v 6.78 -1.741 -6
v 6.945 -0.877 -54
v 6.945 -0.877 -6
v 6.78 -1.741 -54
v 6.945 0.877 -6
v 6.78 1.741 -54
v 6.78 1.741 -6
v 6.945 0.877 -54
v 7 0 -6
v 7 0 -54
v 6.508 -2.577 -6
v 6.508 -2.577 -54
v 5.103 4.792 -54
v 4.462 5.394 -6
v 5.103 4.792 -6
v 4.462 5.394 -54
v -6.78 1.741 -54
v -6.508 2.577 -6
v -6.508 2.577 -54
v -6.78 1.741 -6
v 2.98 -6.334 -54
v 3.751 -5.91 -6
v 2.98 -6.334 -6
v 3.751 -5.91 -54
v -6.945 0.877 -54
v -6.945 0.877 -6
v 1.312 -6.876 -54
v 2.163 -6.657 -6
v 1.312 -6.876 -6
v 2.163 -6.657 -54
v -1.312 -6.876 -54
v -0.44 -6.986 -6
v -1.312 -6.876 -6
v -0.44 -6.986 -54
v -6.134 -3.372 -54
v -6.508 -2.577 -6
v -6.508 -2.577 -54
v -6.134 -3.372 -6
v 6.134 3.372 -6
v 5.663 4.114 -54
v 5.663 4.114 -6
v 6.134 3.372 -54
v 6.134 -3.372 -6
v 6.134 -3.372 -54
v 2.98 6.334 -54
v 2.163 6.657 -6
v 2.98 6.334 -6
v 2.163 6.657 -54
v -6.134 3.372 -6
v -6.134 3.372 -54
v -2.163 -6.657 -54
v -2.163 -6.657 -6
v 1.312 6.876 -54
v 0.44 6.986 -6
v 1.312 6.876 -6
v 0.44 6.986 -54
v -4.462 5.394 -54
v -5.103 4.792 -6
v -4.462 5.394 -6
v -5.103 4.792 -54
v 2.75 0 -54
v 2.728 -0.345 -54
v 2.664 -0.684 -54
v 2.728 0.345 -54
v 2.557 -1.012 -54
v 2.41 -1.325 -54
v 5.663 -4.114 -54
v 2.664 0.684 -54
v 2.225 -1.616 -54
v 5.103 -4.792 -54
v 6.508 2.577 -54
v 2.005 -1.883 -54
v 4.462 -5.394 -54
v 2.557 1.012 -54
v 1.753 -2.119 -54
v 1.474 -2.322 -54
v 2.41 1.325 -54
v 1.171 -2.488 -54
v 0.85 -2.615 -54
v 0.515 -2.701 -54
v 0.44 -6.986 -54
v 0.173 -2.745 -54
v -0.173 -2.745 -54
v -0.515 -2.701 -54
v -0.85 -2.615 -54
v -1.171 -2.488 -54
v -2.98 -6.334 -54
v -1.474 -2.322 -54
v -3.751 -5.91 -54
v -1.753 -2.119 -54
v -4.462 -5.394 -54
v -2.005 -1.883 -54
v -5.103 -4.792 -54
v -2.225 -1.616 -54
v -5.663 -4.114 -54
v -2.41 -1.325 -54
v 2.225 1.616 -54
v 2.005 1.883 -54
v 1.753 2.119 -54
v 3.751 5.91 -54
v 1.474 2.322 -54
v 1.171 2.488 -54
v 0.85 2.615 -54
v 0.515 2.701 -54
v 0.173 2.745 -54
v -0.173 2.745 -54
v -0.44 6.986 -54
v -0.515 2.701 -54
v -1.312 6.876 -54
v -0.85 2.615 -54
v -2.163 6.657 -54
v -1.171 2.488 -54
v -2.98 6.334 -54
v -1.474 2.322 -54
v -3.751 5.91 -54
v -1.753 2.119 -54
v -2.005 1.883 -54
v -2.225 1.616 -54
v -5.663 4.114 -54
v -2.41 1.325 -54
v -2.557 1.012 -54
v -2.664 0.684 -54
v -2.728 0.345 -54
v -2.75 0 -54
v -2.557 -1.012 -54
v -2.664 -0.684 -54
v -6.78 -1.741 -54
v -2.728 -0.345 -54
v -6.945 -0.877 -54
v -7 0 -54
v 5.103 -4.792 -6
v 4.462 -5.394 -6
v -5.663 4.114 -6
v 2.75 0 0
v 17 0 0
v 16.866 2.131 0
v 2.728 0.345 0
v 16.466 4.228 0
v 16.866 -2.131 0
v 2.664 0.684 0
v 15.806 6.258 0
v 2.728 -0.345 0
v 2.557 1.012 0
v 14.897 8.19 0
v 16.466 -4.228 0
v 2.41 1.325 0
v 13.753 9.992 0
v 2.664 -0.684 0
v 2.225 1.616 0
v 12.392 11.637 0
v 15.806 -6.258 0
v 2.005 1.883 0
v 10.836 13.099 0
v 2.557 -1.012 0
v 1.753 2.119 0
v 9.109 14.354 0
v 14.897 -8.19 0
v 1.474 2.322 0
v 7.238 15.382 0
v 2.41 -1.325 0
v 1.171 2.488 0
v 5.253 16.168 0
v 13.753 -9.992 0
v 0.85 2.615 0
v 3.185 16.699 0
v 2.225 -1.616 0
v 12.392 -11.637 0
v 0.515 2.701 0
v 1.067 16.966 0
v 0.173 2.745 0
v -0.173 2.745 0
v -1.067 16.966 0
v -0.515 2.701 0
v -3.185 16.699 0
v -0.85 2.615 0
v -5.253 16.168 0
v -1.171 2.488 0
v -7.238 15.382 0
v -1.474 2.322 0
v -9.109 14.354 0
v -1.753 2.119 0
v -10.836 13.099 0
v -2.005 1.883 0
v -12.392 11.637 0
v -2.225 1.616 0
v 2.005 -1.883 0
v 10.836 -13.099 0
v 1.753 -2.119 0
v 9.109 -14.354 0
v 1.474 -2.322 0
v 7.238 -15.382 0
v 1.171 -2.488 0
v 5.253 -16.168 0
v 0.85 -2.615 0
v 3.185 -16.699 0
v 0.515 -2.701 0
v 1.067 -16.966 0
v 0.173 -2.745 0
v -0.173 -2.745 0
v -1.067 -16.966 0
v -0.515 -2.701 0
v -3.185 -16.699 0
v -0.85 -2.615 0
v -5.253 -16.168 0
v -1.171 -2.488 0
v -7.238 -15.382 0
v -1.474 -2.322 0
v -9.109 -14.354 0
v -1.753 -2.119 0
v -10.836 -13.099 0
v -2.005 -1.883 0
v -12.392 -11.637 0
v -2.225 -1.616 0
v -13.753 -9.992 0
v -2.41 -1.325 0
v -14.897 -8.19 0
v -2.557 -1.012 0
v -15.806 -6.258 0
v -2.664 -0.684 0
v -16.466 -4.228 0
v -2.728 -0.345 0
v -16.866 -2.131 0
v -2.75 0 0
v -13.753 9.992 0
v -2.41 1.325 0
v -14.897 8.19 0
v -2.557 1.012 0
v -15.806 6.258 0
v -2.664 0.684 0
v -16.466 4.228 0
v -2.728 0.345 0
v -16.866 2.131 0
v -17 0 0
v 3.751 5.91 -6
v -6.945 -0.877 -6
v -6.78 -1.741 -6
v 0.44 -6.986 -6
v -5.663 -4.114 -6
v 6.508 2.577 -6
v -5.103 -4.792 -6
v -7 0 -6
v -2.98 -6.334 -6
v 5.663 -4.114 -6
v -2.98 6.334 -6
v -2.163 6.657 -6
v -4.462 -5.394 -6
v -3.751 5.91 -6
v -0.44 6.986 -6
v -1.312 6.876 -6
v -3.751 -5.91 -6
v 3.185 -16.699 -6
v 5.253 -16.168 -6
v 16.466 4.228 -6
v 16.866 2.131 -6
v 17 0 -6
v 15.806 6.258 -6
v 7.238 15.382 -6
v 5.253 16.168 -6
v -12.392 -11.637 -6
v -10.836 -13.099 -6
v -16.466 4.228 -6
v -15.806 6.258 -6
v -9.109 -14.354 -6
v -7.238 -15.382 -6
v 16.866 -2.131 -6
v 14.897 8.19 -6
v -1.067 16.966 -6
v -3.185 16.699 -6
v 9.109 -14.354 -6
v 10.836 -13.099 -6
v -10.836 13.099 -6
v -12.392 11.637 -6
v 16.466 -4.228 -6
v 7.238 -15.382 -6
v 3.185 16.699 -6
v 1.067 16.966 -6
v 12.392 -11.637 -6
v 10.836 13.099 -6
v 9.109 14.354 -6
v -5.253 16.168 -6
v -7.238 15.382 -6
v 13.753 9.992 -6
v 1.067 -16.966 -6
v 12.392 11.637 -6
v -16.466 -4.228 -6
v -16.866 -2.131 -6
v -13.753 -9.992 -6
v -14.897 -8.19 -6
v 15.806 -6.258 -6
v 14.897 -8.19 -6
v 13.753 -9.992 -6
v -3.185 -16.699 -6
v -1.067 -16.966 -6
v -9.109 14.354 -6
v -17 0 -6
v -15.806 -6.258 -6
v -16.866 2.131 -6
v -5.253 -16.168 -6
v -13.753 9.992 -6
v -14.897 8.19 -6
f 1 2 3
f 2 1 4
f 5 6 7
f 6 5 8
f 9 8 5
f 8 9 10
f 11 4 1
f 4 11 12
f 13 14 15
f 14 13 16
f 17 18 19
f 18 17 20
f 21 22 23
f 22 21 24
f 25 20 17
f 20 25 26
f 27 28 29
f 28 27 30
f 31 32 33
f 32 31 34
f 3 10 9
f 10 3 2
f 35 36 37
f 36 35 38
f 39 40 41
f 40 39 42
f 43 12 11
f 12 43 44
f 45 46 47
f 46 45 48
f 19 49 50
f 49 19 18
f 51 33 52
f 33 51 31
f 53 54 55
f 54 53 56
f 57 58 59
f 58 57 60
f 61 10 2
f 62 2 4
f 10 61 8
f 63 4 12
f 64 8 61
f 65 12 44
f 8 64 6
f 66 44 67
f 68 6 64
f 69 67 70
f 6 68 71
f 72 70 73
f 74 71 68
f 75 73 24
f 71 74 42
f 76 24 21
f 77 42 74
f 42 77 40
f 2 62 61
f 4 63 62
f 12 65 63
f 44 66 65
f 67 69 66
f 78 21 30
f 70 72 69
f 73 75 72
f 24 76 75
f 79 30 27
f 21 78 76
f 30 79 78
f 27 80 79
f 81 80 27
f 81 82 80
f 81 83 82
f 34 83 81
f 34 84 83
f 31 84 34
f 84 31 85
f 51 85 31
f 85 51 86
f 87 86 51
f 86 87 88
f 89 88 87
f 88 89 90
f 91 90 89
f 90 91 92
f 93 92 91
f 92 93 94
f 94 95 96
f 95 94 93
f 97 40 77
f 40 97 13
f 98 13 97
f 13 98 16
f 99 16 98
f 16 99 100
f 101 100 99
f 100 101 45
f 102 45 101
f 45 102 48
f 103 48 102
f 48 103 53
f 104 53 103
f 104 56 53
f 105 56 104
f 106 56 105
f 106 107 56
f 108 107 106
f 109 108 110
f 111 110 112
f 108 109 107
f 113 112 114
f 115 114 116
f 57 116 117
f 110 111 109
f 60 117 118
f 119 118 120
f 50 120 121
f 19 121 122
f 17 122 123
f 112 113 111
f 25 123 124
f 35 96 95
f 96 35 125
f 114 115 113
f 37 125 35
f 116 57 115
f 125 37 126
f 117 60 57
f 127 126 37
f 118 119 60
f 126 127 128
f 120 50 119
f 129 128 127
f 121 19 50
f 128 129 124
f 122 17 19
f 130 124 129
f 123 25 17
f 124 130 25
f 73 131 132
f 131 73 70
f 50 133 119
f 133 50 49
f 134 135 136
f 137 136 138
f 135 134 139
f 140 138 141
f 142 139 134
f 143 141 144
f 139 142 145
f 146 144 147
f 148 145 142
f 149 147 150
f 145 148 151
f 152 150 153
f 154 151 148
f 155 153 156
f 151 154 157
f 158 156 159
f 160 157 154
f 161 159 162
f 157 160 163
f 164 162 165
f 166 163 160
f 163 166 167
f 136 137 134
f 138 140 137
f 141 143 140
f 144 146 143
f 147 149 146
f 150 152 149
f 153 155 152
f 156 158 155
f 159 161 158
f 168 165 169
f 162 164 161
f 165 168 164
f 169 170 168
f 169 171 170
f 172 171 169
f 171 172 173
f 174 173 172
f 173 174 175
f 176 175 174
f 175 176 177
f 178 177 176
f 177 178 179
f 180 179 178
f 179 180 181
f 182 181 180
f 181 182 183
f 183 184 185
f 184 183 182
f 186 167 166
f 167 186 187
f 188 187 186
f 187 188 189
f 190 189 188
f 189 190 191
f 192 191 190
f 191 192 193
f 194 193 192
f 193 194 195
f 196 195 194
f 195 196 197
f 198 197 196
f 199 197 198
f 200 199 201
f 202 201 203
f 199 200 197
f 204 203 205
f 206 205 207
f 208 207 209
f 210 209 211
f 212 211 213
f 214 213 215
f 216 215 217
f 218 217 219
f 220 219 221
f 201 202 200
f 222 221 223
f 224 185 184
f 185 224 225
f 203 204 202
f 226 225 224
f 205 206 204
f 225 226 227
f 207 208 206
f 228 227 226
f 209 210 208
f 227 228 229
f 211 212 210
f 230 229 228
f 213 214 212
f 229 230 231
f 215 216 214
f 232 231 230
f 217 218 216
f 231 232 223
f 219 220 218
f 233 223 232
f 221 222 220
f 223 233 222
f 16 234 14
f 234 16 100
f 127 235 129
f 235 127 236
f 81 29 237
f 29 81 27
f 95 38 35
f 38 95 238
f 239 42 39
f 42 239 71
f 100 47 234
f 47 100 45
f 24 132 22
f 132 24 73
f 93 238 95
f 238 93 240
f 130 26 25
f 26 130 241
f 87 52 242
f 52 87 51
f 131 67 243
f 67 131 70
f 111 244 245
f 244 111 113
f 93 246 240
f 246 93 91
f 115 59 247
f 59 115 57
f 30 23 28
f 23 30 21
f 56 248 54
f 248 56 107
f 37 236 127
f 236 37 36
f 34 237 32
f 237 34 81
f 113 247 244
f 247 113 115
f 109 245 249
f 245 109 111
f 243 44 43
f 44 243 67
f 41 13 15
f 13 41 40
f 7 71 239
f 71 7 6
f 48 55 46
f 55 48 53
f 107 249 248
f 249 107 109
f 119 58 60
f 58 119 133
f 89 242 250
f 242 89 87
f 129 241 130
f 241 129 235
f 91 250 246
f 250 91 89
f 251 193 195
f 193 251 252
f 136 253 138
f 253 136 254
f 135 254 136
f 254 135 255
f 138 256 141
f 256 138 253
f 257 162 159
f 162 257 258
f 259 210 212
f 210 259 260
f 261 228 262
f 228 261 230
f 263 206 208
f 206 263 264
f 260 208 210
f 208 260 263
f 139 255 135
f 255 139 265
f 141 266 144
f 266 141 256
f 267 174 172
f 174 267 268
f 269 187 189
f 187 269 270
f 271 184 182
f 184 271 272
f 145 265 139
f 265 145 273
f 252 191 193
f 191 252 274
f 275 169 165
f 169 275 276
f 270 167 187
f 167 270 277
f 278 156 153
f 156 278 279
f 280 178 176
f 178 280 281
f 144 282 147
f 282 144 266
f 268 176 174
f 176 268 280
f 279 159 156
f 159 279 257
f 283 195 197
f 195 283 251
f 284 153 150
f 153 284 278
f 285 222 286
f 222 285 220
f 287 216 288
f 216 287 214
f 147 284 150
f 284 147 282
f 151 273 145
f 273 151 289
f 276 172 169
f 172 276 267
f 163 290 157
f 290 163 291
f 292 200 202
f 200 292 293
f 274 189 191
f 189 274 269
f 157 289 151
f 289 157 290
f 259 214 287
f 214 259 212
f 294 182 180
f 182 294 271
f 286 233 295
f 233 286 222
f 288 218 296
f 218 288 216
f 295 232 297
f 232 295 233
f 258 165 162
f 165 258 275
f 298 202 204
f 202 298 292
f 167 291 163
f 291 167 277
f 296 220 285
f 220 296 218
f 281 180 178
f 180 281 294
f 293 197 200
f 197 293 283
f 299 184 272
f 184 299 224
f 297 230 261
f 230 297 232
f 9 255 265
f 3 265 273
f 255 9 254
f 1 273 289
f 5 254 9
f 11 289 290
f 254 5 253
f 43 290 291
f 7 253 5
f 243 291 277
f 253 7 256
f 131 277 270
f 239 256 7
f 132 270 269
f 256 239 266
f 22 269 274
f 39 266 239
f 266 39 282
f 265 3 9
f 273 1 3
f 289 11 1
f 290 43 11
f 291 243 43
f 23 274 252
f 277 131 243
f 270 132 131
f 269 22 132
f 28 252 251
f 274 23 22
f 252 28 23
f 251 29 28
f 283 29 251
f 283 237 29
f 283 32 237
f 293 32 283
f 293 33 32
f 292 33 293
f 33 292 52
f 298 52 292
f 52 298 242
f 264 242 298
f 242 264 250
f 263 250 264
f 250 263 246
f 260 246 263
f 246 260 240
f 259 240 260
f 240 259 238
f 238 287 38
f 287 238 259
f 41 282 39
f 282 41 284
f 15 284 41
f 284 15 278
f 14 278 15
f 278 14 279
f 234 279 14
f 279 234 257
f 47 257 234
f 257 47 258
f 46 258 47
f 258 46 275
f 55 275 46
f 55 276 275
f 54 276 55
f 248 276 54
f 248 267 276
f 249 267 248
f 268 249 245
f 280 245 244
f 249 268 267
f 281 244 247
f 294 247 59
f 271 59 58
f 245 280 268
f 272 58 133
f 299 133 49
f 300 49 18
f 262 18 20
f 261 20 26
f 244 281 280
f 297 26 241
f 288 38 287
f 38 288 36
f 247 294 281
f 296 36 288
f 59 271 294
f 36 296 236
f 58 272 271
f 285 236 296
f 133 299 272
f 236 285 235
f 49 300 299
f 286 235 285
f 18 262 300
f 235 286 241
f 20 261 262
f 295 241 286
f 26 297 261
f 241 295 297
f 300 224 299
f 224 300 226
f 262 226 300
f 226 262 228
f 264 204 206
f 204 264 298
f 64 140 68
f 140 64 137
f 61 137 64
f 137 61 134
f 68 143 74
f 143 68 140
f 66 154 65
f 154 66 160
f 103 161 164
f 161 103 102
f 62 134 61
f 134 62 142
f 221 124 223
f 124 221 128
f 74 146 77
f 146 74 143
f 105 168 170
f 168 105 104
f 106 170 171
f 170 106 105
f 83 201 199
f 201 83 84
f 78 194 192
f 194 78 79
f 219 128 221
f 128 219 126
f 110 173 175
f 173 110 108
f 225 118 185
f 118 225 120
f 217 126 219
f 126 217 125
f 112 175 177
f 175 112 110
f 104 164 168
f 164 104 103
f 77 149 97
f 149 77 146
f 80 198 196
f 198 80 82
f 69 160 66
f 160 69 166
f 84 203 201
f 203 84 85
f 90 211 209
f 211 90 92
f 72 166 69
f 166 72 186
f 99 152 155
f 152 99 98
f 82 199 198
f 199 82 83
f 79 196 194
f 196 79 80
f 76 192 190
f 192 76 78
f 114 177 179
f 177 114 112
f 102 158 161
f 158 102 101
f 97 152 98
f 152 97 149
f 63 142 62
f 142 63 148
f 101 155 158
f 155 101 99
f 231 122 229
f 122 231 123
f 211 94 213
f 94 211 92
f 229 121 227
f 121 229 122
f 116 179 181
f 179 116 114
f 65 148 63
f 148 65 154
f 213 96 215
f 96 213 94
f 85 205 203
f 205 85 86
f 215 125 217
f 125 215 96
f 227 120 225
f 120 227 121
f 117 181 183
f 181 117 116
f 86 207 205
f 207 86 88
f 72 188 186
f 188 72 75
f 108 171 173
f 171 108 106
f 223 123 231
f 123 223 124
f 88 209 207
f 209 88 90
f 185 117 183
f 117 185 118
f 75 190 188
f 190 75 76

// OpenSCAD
$fn = 50;


difference() {
	union() {
		translate(v = [0, 0, -54.0000000000]) {
			cylinder(h = 54, r = 7.0000000000);
		}
		translate(v = [0, 0, -6.0000000000]) {
			cylinder(h = 6, r = 17.0000000000);
		}
	}
	union() {
		#translate(v = [0, 0, -54]) {
			cylinder(h = 54, r = 2.7500000000);
		}
	}
}
